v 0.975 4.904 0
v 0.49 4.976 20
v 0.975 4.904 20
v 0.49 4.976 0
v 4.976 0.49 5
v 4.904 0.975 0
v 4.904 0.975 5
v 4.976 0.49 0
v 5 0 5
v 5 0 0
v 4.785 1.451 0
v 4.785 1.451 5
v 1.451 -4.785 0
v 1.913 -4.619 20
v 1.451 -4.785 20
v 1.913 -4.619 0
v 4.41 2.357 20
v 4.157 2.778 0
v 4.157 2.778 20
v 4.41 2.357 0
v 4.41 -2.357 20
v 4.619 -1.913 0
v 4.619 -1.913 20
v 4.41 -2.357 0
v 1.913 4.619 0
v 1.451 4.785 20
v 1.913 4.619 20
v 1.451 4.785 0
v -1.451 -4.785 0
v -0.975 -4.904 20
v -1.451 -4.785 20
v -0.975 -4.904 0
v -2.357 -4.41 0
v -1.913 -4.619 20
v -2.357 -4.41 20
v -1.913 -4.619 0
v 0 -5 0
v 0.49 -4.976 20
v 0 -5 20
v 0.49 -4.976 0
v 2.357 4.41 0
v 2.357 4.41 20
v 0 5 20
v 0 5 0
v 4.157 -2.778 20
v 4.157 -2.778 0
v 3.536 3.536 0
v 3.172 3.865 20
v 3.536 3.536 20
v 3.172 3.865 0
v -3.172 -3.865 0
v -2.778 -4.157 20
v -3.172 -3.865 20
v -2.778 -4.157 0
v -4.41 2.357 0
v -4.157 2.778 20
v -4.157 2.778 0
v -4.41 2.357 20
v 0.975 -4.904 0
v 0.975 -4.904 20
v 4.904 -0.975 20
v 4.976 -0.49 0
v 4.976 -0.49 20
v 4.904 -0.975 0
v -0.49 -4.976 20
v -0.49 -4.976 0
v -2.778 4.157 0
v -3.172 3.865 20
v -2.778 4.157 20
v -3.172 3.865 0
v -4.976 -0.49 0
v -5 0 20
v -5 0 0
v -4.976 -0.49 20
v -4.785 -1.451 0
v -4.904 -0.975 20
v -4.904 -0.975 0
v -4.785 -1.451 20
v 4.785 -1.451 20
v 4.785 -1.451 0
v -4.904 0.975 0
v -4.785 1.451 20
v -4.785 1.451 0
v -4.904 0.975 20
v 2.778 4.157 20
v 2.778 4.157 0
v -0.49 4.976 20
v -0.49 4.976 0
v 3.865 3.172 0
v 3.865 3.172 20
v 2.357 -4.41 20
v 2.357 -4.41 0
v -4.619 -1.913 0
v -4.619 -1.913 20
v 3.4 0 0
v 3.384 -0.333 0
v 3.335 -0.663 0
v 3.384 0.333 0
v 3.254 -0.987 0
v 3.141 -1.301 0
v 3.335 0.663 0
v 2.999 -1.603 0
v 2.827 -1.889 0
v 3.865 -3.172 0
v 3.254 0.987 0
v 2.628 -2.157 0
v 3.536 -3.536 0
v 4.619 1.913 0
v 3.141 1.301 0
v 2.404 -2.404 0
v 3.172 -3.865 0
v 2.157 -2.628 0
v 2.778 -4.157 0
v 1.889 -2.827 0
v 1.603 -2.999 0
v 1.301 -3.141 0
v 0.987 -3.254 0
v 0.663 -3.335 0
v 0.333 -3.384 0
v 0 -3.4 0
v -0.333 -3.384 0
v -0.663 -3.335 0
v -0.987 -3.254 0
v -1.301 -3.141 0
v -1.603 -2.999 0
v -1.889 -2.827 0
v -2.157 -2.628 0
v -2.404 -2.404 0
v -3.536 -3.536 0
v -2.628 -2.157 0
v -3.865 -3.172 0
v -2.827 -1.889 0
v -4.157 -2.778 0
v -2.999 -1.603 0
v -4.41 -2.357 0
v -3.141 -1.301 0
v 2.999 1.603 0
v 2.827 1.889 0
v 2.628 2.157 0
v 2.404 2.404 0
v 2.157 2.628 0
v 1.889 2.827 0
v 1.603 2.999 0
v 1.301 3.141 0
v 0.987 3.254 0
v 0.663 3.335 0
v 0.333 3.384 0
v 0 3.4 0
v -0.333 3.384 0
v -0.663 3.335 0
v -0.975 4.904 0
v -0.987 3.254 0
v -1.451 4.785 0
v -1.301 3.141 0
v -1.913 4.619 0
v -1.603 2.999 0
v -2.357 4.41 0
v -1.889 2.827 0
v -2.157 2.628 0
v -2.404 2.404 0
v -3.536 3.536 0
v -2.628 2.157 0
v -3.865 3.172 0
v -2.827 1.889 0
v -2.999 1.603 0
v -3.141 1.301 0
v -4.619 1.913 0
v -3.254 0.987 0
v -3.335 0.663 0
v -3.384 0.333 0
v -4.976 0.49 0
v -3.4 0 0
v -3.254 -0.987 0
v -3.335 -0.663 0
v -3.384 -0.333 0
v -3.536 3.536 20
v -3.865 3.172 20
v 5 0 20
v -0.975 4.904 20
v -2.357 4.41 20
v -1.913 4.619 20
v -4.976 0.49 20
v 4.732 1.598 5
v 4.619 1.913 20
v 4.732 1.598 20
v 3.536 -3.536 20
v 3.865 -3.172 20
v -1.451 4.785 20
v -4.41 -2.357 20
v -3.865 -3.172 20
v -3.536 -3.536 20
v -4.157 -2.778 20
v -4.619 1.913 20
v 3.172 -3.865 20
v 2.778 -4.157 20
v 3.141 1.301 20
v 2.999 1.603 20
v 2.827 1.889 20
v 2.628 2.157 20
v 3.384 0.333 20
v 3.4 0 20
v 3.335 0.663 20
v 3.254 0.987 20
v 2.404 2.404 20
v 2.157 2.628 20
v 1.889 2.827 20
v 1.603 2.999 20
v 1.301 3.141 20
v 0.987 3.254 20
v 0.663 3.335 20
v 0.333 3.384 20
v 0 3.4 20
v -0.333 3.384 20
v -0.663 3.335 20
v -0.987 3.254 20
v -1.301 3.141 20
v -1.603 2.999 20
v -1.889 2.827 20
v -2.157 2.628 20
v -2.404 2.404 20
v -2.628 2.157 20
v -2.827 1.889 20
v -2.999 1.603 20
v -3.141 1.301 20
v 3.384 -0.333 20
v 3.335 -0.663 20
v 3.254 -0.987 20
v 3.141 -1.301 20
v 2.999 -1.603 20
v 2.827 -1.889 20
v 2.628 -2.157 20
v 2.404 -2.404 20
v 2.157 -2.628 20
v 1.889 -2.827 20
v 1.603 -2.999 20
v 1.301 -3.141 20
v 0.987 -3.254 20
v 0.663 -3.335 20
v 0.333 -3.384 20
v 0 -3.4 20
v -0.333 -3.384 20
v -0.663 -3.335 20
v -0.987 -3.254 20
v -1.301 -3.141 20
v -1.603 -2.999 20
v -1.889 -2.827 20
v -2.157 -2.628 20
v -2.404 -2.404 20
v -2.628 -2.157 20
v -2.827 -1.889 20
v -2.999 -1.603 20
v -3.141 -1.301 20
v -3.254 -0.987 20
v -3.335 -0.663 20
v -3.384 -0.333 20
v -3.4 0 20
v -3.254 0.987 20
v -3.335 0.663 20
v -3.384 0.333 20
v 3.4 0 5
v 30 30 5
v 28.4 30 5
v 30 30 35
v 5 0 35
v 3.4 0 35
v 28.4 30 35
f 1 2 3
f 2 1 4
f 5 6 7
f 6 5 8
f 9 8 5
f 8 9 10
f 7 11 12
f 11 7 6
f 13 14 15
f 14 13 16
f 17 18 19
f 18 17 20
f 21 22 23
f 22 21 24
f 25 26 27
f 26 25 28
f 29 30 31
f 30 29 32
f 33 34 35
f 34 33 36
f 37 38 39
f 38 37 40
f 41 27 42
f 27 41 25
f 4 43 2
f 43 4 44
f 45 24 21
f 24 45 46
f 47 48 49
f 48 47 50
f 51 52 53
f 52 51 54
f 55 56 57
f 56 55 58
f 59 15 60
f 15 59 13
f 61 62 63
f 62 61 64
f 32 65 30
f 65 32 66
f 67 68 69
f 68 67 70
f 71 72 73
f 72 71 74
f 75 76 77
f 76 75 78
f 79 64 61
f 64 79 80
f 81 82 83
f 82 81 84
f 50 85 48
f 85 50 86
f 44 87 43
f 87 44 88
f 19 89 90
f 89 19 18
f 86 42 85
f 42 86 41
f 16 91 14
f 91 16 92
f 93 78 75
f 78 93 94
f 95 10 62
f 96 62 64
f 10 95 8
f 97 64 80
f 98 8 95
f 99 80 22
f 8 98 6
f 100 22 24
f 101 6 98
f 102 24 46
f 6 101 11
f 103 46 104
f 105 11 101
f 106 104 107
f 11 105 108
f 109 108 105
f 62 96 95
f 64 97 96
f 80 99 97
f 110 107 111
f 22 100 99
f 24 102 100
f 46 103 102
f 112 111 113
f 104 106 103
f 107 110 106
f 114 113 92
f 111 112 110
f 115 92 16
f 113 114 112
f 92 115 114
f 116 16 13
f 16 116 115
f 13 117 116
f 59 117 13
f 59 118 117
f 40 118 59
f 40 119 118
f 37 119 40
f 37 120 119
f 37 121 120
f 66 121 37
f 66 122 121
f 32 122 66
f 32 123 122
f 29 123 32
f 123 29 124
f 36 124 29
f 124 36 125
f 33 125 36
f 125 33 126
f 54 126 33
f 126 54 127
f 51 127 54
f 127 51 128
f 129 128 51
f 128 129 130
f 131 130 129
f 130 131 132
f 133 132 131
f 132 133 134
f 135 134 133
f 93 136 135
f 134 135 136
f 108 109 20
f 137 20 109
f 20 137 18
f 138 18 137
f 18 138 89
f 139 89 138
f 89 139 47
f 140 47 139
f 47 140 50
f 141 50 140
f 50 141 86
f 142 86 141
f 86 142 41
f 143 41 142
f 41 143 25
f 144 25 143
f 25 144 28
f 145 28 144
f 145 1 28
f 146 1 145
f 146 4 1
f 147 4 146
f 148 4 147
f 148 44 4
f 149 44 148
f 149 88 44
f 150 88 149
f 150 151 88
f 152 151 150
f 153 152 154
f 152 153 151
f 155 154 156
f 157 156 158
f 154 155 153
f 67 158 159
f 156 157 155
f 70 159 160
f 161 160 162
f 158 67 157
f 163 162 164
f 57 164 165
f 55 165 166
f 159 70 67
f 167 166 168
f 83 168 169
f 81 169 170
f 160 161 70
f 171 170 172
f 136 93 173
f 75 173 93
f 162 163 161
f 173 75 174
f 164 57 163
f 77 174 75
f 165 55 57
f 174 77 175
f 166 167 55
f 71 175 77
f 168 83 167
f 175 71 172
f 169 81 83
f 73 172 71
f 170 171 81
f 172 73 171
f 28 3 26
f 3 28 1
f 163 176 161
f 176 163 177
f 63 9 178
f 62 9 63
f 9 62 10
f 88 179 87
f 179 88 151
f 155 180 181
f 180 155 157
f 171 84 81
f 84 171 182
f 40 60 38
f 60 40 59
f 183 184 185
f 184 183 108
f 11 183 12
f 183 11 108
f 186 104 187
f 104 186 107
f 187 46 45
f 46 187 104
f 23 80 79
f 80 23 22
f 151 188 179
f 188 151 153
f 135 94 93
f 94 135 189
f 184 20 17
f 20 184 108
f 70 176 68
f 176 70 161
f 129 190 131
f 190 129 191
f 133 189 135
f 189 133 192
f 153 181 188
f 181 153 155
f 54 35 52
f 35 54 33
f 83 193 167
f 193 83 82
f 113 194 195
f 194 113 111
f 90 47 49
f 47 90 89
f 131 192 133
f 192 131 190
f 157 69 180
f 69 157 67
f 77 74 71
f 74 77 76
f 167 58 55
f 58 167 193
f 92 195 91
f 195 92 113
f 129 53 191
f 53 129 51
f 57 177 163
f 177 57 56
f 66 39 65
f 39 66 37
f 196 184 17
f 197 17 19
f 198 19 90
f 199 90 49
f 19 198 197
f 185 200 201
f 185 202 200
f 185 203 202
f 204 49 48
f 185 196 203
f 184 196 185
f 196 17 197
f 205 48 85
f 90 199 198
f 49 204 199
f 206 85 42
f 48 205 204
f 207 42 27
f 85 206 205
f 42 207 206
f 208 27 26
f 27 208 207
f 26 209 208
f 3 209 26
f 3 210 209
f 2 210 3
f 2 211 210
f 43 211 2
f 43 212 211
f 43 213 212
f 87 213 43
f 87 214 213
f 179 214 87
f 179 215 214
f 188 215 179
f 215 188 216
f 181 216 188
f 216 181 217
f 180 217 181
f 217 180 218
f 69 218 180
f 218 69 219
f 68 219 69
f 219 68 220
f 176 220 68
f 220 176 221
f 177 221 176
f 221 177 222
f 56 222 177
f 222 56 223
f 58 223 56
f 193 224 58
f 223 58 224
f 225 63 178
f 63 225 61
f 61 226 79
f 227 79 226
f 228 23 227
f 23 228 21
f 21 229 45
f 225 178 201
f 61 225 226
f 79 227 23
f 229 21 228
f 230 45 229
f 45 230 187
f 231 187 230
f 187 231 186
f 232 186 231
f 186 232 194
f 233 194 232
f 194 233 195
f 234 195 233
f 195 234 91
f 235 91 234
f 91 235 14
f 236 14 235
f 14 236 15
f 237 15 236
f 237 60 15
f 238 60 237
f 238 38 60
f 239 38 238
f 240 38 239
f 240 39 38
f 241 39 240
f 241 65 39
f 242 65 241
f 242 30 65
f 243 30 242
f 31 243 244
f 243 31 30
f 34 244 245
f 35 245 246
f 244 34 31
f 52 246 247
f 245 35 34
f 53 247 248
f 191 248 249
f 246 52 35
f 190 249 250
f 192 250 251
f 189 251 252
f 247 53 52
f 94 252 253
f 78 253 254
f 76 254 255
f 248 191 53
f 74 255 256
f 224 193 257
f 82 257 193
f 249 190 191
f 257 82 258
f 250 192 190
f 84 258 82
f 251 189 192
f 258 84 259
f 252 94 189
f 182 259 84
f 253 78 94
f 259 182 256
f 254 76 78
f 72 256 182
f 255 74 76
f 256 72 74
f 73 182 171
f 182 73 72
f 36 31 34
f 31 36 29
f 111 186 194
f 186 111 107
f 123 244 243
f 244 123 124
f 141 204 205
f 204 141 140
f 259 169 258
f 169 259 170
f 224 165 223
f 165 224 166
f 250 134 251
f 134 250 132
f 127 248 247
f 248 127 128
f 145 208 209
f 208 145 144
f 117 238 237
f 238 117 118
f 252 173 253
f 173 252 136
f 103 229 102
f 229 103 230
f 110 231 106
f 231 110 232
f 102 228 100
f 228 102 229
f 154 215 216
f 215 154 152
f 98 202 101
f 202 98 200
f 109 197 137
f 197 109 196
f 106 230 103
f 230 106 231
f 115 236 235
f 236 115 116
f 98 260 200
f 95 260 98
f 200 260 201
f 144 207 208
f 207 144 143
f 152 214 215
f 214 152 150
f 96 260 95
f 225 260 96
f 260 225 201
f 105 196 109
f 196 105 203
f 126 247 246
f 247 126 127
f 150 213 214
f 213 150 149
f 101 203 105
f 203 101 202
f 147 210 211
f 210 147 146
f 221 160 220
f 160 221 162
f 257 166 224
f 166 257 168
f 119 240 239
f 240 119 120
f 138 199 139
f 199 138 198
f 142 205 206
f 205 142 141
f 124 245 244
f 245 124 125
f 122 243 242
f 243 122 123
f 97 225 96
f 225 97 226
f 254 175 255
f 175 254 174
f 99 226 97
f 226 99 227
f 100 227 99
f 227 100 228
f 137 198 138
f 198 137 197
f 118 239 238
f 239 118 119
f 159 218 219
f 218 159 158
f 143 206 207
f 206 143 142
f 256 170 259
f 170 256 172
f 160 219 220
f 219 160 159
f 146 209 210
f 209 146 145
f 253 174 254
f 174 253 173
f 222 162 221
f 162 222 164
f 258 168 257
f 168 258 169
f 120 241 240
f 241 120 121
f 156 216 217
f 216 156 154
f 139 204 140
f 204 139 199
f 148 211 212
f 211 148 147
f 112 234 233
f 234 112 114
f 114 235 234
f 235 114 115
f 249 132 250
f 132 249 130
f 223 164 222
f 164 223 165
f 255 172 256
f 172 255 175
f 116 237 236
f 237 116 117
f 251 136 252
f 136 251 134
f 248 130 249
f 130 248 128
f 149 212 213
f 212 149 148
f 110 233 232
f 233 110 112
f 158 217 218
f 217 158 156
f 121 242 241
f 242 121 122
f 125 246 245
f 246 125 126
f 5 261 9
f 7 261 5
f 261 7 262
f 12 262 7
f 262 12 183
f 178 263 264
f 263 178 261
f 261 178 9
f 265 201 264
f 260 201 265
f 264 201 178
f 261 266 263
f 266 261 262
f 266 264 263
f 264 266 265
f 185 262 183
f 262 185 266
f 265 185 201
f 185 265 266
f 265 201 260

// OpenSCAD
// Lab Funnel Design
// Units: millimetres
// Orientation: Upright, wide opening at top, rests on XY plane at z=0.

// --- Dimensions ---
// Spout (Tube)
$spout_outer_diameter = 10;
$spout_inner_diameter = 6.8; // 10 - 2*1.6
$spout_length = 20;

// Cone (Funnel)
$cone_bottom_diameter = 10; // Matches spout outer diameter
$cone_top_diameter = 60;
$cone_height = 30; // From z=20 to z=50

// Wall Thickness
$wall_thickness = 1.6;

// Resolution for curved surfaces
$fn = 64;

// --- Helper Functions ---

// Function to create a hollow cylinder (tube)
// Arguments: outer_d, inner_d, height, position (x,y,z)
module hollow_cylinder(outer_d, inner_d, height, pos = [0,0,0]) {
    translate(pos) {
        difference() {
            cylinder(h = height, d = outer_d, $fn = $fn);
            cylinder(h = height, d = inner_d, $fn = $fn);
        }
    }
}

// Function to create a hollow cone using linear_extrude
// Arguments: bottom_d, top_d, height, position (x,y,z)
// bottom_d is at z=pos[2], top_d is at z=pos[2]+height
module hollow_cone(bottom_d, top_d, height, pos = [0,0,0]) {
    translate(pos) {
        // Calculate radii for the profile
        r_bottom = bottom_d / 2;
        r_top = top_d / 2;
        
        // Calculate inner radii for the hole
        r_inner_bottom = bottom_d / 2 - $wall_thickness;
        r_inner_top = top_d / 2 - $wall_thickness;
        
        // Define the outer profile points (X, Z)
        // Start at bottom center (0,0), go to bottom edge, up to top edge, back to top center
        // We extrude along Y.
        // Points: [x, z]
        outer_profile = [
            [0, 0],
            [r_bottom, 0],
            [r_top, height],
            [0, height]
        ];
        
        // Define the inner profile points
        inner_profile = [
            [0, 0],
            [r_inner_bottom, 0],
            [r_inner_top, height],
            [0, height]
        ];
        
        difference() {
            // Extrude outer profile
            linear_extrude(height = height, center = true, twist = 0, convexity = 3) {
                polygon(points = outer_profile);
            }
            
            // Extrude inner profile (the hole)
            linear_extrude(height = height, center = true, twist = 0, convexity = 3) {
                polygon(points = inner_profile);
            }
        }
    }
}

// --- Main Assembly ---

// 1. Build the Spout (Tube)
// Position: z=0 to z=20
hollow_cylinder(
    outer_d = $spout_outer_diameter,
    inner_d = $spout_inner_diameter,
    height = $spout_length,
    pos = [0, 0, 0]
);

// 2. Build the Cone (Funnel)
// Position: z=20 to z=50
hollow_cone(
    bottom_d = $cone_bottom_diameter,
    top_d = $cone_top_diameter,
    height = $cone_height,
    pos = [0, 0, 20]
);
